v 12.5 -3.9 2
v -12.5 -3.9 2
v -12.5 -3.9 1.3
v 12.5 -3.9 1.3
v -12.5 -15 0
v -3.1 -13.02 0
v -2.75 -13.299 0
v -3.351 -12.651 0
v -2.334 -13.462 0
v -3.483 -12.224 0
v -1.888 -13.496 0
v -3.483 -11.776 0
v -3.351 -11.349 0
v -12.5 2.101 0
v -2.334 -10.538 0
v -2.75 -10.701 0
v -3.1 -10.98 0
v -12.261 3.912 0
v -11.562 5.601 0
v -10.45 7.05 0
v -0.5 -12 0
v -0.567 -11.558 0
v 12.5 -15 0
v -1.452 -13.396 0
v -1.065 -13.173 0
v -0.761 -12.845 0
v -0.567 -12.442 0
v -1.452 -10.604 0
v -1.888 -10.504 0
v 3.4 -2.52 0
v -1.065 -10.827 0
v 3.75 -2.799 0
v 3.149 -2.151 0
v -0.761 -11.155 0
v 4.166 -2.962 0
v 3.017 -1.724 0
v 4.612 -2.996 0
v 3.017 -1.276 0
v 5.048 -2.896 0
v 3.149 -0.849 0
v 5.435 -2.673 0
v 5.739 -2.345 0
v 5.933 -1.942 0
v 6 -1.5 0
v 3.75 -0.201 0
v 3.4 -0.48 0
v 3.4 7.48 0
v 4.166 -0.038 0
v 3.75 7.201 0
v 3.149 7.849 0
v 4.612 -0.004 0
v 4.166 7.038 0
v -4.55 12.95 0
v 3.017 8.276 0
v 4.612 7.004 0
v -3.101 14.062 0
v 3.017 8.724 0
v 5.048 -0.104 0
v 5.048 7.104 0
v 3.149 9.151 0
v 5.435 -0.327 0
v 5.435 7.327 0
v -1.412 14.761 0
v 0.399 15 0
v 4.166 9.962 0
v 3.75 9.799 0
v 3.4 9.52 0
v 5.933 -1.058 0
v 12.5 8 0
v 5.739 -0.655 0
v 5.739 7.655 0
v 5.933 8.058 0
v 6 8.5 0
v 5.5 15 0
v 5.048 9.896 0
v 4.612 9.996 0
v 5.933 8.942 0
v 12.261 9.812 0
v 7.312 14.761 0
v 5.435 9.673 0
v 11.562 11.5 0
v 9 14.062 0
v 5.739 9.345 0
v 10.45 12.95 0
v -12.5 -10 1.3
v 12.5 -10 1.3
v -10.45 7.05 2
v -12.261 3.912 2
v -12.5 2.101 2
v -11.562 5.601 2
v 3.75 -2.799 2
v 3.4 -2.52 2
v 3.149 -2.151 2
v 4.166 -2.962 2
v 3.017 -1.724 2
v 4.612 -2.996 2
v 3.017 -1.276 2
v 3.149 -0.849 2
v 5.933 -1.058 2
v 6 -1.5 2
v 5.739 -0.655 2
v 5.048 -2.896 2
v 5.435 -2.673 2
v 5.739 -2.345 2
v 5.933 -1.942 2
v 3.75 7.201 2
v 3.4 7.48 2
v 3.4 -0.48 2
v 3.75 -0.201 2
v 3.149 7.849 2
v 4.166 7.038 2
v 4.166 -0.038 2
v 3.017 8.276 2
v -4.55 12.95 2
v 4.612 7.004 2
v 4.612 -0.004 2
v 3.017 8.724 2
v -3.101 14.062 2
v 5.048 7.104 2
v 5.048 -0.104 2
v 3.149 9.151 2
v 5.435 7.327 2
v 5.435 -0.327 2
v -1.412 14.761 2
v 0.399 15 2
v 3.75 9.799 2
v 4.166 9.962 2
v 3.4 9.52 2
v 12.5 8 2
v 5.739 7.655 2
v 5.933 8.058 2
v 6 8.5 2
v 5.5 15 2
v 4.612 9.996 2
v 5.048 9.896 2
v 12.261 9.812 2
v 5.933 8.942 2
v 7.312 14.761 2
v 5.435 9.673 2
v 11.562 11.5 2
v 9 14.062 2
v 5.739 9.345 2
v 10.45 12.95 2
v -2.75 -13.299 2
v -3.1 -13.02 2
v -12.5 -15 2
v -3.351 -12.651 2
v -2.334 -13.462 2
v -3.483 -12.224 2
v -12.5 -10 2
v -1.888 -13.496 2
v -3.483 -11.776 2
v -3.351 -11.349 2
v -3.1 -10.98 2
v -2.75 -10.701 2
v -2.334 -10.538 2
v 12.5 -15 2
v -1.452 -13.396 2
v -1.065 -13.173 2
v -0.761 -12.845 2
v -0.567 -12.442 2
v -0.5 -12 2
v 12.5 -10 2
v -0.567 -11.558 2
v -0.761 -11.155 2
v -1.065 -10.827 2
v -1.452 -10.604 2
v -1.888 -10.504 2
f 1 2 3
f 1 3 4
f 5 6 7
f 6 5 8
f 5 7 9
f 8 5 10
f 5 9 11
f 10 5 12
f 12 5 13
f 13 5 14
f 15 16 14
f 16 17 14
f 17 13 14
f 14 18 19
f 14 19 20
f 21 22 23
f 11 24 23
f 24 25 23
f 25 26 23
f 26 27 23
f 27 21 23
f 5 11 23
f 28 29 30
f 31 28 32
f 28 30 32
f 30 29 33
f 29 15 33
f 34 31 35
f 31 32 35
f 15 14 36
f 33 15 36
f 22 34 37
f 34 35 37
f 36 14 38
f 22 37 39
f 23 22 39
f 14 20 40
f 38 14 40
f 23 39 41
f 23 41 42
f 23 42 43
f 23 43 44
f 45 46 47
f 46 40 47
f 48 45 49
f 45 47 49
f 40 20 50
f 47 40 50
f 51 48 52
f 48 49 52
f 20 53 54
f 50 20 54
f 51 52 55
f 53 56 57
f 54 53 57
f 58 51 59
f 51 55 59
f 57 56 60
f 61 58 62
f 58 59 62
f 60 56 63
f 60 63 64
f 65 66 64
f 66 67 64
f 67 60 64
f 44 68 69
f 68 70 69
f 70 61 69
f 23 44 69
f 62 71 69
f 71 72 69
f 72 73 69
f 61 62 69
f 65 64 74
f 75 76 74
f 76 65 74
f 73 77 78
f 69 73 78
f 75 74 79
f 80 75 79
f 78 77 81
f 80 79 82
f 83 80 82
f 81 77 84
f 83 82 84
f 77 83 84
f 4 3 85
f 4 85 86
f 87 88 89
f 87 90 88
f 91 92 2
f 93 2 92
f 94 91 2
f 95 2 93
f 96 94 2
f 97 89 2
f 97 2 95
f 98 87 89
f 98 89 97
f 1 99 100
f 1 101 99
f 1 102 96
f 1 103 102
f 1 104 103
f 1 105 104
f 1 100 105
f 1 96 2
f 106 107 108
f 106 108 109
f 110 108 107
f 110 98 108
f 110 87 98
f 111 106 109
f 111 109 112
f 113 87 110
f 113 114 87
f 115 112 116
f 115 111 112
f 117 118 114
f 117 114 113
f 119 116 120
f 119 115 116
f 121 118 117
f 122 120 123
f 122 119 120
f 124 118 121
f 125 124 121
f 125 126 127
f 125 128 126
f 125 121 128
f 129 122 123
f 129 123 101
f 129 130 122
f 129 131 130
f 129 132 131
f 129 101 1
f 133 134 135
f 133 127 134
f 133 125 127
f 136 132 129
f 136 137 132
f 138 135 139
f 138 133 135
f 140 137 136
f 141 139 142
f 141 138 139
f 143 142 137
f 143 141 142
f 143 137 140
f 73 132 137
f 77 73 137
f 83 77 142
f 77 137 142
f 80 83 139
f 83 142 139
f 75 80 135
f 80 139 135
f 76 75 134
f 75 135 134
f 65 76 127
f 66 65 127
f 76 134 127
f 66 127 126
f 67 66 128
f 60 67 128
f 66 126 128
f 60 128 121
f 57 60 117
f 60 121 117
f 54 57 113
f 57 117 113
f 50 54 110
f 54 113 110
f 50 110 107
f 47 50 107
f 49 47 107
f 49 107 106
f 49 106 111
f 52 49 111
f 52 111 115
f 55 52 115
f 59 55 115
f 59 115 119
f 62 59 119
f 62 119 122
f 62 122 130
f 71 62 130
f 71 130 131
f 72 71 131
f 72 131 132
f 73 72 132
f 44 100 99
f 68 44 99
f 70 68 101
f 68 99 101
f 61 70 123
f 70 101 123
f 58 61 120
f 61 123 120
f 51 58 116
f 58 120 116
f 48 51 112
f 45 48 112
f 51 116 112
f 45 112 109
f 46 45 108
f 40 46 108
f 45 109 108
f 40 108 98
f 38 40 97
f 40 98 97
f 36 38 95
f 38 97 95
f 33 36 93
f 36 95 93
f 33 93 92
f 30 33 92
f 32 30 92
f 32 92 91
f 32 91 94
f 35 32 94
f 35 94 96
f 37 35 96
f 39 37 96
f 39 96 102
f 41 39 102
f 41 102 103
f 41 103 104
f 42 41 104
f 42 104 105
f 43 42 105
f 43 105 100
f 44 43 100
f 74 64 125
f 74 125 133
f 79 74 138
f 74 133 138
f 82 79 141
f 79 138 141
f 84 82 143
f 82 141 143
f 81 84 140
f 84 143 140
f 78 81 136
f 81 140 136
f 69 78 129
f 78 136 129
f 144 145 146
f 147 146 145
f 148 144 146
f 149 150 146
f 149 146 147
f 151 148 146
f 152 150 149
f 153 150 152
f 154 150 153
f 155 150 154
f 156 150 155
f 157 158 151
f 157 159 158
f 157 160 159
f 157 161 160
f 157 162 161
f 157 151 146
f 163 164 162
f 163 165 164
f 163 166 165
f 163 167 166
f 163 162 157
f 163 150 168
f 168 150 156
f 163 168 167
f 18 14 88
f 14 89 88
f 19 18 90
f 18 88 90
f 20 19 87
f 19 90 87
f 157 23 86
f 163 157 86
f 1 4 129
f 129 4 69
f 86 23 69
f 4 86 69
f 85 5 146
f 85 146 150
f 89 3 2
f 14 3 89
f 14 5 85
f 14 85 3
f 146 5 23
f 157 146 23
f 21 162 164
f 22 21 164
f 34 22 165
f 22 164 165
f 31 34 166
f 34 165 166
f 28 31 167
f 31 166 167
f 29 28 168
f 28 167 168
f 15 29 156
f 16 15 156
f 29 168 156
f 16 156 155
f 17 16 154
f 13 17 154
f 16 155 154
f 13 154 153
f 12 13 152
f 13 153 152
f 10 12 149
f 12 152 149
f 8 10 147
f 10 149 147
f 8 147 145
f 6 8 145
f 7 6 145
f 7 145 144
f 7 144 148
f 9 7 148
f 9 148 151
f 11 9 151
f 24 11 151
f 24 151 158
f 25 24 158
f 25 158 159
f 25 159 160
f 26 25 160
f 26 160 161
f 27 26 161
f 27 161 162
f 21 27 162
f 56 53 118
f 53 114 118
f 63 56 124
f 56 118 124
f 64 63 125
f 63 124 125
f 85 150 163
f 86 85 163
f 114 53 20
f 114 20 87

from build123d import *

# Parameters (mm, degrees)
F0_W     = 25
F0_H     = 30
F1_DEPTH = 2
F2_R     = 1.5
F3_DEPTH = 2.001
F4_W     = 25
F4_H     = 6.1
F5_DEPTH = 0.7
F6_SIZE  = 10
F7_R     = 7


with BuildPart() as f1:
    # F0 (on Top) → F1 (new body)
    with BuildSketch(Plane.XY):
        Rectangle(F0_W, F0_H)
    extrude(amount=F1_DEPTH)

    # F2 (on face) → F3 (cut, through all)
    with BuildSketch(Plane.XY.offset(2)):
        with Locations((-2, -12)):
            Circle(F2_R)
        with Locations((4.5, -1.5)):
            Circle(F2_R)
        with Locations((4.5, 8.5)):
            Circle(F2_R)
    extrude(amount=-F3_DEPTH, mode=Mode.SUBTRACT)

    # F4 (on face) → F5 (cut)
    with BuildSketch(Plane.XY.offset(2)):
        with Locations((0, -6.95)):
            Rectangle(F4_W, F4_H)
    extrude(amount=-F5_DEPTH, mode=Mode.SUBTRACT)

    # F6
    f6_edges = [f1.edges().sort_by_distance(p)[0] for p in [
        (-12.5, 15, 1),
    ]]
    chamfer(f6_edges, length=F6_SIZE)

    # F7
    f7_edges = [f1.edges().sort_by_distance(p)[0] for p in [
        (-12.5, 5, 1),
        (-2.5, 15, 1),
        (12.5, 15, 1),
    ]]
    fillet(f7_edges, radius=F7_R)


solid = f1.part
